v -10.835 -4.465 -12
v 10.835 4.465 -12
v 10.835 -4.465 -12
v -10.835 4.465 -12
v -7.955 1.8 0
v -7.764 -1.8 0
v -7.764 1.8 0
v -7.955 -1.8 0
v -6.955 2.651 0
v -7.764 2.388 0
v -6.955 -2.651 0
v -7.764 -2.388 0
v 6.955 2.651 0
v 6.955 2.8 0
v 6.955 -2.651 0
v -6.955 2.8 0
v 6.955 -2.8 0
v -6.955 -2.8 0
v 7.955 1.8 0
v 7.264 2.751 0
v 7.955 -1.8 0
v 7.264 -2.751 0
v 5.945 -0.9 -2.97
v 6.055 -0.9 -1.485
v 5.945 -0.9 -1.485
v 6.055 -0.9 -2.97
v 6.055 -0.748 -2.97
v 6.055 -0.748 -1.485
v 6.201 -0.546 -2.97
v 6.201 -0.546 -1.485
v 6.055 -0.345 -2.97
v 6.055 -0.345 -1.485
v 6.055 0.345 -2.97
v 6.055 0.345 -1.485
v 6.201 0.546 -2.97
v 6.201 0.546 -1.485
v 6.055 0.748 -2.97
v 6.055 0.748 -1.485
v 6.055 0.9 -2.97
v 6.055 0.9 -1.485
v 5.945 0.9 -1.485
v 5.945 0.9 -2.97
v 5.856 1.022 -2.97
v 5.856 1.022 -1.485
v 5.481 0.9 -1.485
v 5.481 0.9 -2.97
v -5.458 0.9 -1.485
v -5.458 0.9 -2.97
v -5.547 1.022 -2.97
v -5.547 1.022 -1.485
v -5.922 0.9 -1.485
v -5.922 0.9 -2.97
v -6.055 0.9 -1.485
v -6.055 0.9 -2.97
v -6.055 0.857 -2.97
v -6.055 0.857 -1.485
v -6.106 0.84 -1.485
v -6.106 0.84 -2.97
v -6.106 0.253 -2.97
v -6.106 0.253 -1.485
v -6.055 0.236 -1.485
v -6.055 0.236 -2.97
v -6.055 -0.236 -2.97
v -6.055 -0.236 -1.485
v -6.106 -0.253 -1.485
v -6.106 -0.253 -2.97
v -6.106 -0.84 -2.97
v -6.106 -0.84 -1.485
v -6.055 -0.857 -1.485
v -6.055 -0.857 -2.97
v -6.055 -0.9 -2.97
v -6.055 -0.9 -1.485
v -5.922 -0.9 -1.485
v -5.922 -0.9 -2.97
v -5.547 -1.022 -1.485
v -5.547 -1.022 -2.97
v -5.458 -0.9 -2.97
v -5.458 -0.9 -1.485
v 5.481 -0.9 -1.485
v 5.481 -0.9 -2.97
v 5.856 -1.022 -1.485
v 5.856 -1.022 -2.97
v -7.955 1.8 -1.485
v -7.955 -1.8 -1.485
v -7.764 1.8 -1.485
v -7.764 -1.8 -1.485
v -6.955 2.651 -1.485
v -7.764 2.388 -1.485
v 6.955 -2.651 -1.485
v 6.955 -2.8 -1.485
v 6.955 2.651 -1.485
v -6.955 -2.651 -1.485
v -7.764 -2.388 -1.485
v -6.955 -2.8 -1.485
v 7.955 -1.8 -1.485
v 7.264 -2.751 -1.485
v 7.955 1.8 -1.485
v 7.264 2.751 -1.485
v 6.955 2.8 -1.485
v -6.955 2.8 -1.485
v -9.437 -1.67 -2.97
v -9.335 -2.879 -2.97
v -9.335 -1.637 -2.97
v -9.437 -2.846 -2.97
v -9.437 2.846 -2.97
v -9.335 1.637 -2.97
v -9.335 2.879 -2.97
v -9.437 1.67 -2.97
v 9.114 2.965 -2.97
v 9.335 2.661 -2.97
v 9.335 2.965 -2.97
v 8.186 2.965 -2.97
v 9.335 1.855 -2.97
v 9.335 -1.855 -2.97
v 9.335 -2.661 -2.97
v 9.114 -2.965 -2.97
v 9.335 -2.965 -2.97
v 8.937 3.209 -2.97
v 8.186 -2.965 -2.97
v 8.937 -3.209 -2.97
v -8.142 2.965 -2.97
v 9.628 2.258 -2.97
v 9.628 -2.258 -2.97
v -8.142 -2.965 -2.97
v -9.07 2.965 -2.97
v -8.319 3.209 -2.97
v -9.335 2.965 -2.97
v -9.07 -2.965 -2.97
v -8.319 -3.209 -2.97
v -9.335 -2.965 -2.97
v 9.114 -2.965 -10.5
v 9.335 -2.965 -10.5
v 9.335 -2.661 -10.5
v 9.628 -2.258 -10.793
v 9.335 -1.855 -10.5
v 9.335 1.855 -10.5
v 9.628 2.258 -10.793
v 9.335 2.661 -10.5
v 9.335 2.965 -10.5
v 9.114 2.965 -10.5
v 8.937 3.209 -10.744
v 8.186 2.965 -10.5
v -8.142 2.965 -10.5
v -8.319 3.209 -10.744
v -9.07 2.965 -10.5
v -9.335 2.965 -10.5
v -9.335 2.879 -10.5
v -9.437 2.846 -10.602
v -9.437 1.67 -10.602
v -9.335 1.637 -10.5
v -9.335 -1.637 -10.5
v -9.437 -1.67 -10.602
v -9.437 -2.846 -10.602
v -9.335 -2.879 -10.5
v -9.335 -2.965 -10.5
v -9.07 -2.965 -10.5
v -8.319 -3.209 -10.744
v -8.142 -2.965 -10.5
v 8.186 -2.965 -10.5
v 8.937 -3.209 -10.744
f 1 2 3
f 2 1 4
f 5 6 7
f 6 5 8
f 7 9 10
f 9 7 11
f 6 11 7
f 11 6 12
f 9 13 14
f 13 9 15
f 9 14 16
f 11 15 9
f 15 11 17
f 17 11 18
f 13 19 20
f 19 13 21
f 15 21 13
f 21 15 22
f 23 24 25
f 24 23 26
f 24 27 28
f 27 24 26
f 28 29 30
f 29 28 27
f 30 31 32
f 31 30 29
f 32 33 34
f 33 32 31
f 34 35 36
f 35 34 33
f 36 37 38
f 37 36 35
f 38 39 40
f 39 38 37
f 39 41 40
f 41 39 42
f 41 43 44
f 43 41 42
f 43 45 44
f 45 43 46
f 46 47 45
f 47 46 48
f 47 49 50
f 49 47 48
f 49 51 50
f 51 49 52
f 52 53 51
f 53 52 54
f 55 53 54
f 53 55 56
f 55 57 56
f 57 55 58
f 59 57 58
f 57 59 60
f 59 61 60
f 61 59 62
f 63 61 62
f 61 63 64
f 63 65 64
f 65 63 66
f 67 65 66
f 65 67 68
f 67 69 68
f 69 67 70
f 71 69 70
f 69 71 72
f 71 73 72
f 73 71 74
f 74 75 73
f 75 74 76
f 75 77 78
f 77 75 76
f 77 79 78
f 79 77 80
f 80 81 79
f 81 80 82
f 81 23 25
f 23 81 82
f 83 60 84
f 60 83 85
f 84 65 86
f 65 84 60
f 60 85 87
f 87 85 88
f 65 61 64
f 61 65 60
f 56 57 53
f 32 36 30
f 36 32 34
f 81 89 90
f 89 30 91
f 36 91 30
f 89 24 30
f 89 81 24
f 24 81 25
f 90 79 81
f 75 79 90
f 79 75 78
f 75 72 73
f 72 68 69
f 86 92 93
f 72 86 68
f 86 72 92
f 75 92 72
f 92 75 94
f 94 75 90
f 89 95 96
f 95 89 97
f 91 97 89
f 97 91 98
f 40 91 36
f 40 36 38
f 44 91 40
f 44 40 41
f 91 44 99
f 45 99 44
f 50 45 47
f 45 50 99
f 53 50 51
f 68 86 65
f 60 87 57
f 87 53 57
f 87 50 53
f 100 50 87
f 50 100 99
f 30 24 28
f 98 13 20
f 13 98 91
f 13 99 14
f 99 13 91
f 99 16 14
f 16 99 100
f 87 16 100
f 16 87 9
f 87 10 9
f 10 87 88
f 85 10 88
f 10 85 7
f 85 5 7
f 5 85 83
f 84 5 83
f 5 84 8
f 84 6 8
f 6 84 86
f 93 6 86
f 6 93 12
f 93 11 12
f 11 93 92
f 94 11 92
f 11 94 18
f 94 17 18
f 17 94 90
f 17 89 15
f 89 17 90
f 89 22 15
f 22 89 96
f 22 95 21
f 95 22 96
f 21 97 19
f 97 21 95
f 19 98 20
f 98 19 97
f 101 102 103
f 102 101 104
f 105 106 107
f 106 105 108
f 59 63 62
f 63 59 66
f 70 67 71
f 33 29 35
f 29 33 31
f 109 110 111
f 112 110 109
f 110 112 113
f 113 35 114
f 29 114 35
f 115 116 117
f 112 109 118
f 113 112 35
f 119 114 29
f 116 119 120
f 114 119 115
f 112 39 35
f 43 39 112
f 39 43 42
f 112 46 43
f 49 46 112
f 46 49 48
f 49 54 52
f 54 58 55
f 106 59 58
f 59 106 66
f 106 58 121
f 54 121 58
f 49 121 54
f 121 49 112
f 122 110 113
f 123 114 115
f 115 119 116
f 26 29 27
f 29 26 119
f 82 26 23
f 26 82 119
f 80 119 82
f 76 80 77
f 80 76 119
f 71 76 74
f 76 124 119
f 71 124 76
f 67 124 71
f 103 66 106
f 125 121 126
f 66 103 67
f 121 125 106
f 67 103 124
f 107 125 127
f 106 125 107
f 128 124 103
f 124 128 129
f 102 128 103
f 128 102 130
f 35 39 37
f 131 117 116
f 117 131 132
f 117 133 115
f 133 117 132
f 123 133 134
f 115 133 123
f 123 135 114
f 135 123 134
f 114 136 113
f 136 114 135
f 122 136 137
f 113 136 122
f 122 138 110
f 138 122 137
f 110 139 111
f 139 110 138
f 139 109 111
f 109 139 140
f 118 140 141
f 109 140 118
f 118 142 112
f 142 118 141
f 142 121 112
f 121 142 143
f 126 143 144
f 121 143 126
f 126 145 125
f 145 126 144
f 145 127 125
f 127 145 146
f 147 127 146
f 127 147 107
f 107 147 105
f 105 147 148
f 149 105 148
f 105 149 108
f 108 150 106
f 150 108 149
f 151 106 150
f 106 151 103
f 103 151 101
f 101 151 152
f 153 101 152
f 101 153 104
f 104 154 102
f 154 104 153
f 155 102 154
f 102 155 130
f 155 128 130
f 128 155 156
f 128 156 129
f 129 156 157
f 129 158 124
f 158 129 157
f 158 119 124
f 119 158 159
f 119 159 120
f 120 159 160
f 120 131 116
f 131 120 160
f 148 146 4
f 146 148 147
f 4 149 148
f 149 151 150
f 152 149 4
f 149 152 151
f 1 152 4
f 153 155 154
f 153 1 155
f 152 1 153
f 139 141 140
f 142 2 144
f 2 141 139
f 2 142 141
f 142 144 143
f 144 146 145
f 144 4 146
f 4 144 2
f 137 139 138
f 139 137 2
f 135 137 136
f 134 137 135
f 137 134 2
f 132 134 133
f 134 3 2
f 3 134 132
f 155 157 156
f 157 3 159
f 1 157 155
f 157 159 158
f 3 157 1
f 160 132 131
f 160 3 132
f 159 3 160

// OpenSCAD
//$fn = 60;


// kinda like the built-in square() function except it will produce rounded corners with radius r
// drill=true means the corners will be drilled out
module square_rounded(size, r=1, drill=false, center=true){
    offsetx =   center ? 0 : size[0]/2 ;
    offsety =   center ? 0 : size[1]/2 ;
    translate([offsetx, offsety, 0]){
        if (drill == false){
            difference(){// subtract away the corners to get rounds
                square(size, center=true);
                translate([size[0]/2-r,size[1]/2-r,0]) difference(){
                    translate([0,0,0]) square([r,r]);
                    circle(r=r);
                }
                translate([-size[0]/2+r,-size[1]/2+r,0]) difference(){
                    translate([-r,-r,0]) square([r,r]);
                    circle(r=r);
                }
                translate([-size[0]/2+r,size[1]/2-r,0]) difference(){
                    translate([-r,0,0]) square([r,r]);
                    circle(r=r);
                }
                translate([size[0]/2-r,-size[1]/2+r,0]) difference(){
                    translate([0,-r,0]) square([r,r]);
                    circle(r=r);
                }
            }
        } else { // drill is true
            union(){
                square(size, center=true);
                translate([size[0]/2-r/sqrt(2), size[1]/2-r/sqrt(2)]) circle(r=r);
                translate([-size[0]/2+r/sqrt(2), -size[1]/2+r/sqrt(2)]) circle(r=r);
                translate([-size[0]/2+r/sqrt(2), size[1]/2-r/sqrt(2)]) circle(r=r);
                translate([size[0]/2-r/sqrt(2), -size[1]/2+r/sqrt(2)]) circle(r=r);
            }
        } // end drill or not
    } // end translate
} // end module

// produces a shape to be subtracted from a plate for the PCB card-edge passthrough at [0,0,0]
// t = plate thickness

// rows = number of rows of the samtec MECF-DV connector we'll make a pocket for (must be 8 or 20)
// con_clearance = clearance between mated connector and pocket on all sides
// r = tool radius
// r_pcb = PCB slot tool radius
// gp_buffer = glue pocket buffer space around PCB
// pcb_t = PCB tab thickness
// pcb_clearance = clearance around PCB in its slot
// length for allignment fillets
module card_edge_passthrough(rows=8, con_clearance=0.10, t=12, r=1, gp_buffer=2, pcb_t=1.6, r_pcb=0.5, pcb_clearance=0.1, fillet_length=1.5){
    connector_height=8.78+0.15; //mm SAMTEC MECF-XX-01-L-DV-NP-WT (worst case (largest) size)
    connector_width=5.6+0.13; //mm SAMTEC MECF-XX-01-L-DV-NP-WT (worst case (largest) size)

    con_len = (rows==8)?18.34+0.13:(rows==20)?33.58+0.13:NaN;
    pcb_len = (rows==8)?11.91:(rows==20)?27.15:NaN;

    // calculate connector pocket corner coordinates
    cp_len = con_len+2*con_clearance; // length of connector pocket
    cp_width = connector_width+2*con_clearance; // width of connector pocket
    con_cornerA = [cp_len/2, cp_width/2];
    con_cornerB = [-cp_len/2, -cp_width/2];
    con_cornerC = [-cp_len/2, cp_width/2];
    con_cornerD = [cp_len/2, -cp_width/2];
    
    // calculations for fillet polyhedron thing
    fillet_corner0 = [con_cornerB[0] - fillet_length, con_cornerB[1] - fillet_length, -t];
    fillet_corner1 = [con_cornerC[0] - fillet_length, con_cornerC[1] + fillet_length, -t];
    fillet_corner2 = [con_cornerA[0] + fillet_length, con_cornerA[1] + fillet_length, -t];
    fillet_corner3 = [con_cornerD[0] + fillet_length, con_cornerD[1] - fillet_length, -t];
    fillet_corner4 = [con_cornerB[0], con_cornerB[1], -t + fillet_length];
    fillet_corner5 = [con_cornerC[0], con_cornerC[1], -t + fillet_length];
    fillet_corner6 = [con_cornerA[0], con_cornerA[1], -t + fillet_length];
    fillet_corner7 = [con_cornerD[0], con_cornerD[1], -t + fillet_length];
    p_points =[ fillet_corner0, fillet_corner1, fillet_corner2, fillet_corner3, fillet_corner4, fillet_corner5, fillet_corner6, fillet_corner7 ];
    p_faces = [ [0,1,2,3], [4,5,1,0], [7,6,5,4], [5,6,2,1], [6,7,3,2], [7,4,0,3] ];
    
    // calculate some glue pocket parameters
    above_connector = t-connector_height-con_clearance; // space above the connector pocket
    echo(above_connector);
    gp_width = 2*gp_buffer + pcb_t; // width of glue pocket
    gp_len = 2*gp_buffer + pcb_len; // length of glue pocket
    glue_pocket_depth = above_connector/2; // depth of glue pocket
    
    union(){
        // fabricate the board slot
        translate([0,0,-t]) linear_extrude(t) square_rounded([pcb_len+2*pcb_clearance, pcb_t+2*pcb_clearance], r=r_pcb, drill=true);
        
        // fabricate the rounded corner glue pocket
        translate([0,0,-glue_pocket_depth]) linear_extrude(glue_pocket_depth) square_rounded([gp_len, gp_width], r=r);
        
        // fabricate connector socket well with drilled corners
        translate([0,0,-t]) linear_extrude(connector_height+con_clearance) square_rounded([cp_len, cp_width], r=r, drill=true);
        
        // fabriate fillet guide base
        polyhedron( points=p_points, faces=p_faces);
    } // end union top level union
} // end module


card_edge_passthrough();
